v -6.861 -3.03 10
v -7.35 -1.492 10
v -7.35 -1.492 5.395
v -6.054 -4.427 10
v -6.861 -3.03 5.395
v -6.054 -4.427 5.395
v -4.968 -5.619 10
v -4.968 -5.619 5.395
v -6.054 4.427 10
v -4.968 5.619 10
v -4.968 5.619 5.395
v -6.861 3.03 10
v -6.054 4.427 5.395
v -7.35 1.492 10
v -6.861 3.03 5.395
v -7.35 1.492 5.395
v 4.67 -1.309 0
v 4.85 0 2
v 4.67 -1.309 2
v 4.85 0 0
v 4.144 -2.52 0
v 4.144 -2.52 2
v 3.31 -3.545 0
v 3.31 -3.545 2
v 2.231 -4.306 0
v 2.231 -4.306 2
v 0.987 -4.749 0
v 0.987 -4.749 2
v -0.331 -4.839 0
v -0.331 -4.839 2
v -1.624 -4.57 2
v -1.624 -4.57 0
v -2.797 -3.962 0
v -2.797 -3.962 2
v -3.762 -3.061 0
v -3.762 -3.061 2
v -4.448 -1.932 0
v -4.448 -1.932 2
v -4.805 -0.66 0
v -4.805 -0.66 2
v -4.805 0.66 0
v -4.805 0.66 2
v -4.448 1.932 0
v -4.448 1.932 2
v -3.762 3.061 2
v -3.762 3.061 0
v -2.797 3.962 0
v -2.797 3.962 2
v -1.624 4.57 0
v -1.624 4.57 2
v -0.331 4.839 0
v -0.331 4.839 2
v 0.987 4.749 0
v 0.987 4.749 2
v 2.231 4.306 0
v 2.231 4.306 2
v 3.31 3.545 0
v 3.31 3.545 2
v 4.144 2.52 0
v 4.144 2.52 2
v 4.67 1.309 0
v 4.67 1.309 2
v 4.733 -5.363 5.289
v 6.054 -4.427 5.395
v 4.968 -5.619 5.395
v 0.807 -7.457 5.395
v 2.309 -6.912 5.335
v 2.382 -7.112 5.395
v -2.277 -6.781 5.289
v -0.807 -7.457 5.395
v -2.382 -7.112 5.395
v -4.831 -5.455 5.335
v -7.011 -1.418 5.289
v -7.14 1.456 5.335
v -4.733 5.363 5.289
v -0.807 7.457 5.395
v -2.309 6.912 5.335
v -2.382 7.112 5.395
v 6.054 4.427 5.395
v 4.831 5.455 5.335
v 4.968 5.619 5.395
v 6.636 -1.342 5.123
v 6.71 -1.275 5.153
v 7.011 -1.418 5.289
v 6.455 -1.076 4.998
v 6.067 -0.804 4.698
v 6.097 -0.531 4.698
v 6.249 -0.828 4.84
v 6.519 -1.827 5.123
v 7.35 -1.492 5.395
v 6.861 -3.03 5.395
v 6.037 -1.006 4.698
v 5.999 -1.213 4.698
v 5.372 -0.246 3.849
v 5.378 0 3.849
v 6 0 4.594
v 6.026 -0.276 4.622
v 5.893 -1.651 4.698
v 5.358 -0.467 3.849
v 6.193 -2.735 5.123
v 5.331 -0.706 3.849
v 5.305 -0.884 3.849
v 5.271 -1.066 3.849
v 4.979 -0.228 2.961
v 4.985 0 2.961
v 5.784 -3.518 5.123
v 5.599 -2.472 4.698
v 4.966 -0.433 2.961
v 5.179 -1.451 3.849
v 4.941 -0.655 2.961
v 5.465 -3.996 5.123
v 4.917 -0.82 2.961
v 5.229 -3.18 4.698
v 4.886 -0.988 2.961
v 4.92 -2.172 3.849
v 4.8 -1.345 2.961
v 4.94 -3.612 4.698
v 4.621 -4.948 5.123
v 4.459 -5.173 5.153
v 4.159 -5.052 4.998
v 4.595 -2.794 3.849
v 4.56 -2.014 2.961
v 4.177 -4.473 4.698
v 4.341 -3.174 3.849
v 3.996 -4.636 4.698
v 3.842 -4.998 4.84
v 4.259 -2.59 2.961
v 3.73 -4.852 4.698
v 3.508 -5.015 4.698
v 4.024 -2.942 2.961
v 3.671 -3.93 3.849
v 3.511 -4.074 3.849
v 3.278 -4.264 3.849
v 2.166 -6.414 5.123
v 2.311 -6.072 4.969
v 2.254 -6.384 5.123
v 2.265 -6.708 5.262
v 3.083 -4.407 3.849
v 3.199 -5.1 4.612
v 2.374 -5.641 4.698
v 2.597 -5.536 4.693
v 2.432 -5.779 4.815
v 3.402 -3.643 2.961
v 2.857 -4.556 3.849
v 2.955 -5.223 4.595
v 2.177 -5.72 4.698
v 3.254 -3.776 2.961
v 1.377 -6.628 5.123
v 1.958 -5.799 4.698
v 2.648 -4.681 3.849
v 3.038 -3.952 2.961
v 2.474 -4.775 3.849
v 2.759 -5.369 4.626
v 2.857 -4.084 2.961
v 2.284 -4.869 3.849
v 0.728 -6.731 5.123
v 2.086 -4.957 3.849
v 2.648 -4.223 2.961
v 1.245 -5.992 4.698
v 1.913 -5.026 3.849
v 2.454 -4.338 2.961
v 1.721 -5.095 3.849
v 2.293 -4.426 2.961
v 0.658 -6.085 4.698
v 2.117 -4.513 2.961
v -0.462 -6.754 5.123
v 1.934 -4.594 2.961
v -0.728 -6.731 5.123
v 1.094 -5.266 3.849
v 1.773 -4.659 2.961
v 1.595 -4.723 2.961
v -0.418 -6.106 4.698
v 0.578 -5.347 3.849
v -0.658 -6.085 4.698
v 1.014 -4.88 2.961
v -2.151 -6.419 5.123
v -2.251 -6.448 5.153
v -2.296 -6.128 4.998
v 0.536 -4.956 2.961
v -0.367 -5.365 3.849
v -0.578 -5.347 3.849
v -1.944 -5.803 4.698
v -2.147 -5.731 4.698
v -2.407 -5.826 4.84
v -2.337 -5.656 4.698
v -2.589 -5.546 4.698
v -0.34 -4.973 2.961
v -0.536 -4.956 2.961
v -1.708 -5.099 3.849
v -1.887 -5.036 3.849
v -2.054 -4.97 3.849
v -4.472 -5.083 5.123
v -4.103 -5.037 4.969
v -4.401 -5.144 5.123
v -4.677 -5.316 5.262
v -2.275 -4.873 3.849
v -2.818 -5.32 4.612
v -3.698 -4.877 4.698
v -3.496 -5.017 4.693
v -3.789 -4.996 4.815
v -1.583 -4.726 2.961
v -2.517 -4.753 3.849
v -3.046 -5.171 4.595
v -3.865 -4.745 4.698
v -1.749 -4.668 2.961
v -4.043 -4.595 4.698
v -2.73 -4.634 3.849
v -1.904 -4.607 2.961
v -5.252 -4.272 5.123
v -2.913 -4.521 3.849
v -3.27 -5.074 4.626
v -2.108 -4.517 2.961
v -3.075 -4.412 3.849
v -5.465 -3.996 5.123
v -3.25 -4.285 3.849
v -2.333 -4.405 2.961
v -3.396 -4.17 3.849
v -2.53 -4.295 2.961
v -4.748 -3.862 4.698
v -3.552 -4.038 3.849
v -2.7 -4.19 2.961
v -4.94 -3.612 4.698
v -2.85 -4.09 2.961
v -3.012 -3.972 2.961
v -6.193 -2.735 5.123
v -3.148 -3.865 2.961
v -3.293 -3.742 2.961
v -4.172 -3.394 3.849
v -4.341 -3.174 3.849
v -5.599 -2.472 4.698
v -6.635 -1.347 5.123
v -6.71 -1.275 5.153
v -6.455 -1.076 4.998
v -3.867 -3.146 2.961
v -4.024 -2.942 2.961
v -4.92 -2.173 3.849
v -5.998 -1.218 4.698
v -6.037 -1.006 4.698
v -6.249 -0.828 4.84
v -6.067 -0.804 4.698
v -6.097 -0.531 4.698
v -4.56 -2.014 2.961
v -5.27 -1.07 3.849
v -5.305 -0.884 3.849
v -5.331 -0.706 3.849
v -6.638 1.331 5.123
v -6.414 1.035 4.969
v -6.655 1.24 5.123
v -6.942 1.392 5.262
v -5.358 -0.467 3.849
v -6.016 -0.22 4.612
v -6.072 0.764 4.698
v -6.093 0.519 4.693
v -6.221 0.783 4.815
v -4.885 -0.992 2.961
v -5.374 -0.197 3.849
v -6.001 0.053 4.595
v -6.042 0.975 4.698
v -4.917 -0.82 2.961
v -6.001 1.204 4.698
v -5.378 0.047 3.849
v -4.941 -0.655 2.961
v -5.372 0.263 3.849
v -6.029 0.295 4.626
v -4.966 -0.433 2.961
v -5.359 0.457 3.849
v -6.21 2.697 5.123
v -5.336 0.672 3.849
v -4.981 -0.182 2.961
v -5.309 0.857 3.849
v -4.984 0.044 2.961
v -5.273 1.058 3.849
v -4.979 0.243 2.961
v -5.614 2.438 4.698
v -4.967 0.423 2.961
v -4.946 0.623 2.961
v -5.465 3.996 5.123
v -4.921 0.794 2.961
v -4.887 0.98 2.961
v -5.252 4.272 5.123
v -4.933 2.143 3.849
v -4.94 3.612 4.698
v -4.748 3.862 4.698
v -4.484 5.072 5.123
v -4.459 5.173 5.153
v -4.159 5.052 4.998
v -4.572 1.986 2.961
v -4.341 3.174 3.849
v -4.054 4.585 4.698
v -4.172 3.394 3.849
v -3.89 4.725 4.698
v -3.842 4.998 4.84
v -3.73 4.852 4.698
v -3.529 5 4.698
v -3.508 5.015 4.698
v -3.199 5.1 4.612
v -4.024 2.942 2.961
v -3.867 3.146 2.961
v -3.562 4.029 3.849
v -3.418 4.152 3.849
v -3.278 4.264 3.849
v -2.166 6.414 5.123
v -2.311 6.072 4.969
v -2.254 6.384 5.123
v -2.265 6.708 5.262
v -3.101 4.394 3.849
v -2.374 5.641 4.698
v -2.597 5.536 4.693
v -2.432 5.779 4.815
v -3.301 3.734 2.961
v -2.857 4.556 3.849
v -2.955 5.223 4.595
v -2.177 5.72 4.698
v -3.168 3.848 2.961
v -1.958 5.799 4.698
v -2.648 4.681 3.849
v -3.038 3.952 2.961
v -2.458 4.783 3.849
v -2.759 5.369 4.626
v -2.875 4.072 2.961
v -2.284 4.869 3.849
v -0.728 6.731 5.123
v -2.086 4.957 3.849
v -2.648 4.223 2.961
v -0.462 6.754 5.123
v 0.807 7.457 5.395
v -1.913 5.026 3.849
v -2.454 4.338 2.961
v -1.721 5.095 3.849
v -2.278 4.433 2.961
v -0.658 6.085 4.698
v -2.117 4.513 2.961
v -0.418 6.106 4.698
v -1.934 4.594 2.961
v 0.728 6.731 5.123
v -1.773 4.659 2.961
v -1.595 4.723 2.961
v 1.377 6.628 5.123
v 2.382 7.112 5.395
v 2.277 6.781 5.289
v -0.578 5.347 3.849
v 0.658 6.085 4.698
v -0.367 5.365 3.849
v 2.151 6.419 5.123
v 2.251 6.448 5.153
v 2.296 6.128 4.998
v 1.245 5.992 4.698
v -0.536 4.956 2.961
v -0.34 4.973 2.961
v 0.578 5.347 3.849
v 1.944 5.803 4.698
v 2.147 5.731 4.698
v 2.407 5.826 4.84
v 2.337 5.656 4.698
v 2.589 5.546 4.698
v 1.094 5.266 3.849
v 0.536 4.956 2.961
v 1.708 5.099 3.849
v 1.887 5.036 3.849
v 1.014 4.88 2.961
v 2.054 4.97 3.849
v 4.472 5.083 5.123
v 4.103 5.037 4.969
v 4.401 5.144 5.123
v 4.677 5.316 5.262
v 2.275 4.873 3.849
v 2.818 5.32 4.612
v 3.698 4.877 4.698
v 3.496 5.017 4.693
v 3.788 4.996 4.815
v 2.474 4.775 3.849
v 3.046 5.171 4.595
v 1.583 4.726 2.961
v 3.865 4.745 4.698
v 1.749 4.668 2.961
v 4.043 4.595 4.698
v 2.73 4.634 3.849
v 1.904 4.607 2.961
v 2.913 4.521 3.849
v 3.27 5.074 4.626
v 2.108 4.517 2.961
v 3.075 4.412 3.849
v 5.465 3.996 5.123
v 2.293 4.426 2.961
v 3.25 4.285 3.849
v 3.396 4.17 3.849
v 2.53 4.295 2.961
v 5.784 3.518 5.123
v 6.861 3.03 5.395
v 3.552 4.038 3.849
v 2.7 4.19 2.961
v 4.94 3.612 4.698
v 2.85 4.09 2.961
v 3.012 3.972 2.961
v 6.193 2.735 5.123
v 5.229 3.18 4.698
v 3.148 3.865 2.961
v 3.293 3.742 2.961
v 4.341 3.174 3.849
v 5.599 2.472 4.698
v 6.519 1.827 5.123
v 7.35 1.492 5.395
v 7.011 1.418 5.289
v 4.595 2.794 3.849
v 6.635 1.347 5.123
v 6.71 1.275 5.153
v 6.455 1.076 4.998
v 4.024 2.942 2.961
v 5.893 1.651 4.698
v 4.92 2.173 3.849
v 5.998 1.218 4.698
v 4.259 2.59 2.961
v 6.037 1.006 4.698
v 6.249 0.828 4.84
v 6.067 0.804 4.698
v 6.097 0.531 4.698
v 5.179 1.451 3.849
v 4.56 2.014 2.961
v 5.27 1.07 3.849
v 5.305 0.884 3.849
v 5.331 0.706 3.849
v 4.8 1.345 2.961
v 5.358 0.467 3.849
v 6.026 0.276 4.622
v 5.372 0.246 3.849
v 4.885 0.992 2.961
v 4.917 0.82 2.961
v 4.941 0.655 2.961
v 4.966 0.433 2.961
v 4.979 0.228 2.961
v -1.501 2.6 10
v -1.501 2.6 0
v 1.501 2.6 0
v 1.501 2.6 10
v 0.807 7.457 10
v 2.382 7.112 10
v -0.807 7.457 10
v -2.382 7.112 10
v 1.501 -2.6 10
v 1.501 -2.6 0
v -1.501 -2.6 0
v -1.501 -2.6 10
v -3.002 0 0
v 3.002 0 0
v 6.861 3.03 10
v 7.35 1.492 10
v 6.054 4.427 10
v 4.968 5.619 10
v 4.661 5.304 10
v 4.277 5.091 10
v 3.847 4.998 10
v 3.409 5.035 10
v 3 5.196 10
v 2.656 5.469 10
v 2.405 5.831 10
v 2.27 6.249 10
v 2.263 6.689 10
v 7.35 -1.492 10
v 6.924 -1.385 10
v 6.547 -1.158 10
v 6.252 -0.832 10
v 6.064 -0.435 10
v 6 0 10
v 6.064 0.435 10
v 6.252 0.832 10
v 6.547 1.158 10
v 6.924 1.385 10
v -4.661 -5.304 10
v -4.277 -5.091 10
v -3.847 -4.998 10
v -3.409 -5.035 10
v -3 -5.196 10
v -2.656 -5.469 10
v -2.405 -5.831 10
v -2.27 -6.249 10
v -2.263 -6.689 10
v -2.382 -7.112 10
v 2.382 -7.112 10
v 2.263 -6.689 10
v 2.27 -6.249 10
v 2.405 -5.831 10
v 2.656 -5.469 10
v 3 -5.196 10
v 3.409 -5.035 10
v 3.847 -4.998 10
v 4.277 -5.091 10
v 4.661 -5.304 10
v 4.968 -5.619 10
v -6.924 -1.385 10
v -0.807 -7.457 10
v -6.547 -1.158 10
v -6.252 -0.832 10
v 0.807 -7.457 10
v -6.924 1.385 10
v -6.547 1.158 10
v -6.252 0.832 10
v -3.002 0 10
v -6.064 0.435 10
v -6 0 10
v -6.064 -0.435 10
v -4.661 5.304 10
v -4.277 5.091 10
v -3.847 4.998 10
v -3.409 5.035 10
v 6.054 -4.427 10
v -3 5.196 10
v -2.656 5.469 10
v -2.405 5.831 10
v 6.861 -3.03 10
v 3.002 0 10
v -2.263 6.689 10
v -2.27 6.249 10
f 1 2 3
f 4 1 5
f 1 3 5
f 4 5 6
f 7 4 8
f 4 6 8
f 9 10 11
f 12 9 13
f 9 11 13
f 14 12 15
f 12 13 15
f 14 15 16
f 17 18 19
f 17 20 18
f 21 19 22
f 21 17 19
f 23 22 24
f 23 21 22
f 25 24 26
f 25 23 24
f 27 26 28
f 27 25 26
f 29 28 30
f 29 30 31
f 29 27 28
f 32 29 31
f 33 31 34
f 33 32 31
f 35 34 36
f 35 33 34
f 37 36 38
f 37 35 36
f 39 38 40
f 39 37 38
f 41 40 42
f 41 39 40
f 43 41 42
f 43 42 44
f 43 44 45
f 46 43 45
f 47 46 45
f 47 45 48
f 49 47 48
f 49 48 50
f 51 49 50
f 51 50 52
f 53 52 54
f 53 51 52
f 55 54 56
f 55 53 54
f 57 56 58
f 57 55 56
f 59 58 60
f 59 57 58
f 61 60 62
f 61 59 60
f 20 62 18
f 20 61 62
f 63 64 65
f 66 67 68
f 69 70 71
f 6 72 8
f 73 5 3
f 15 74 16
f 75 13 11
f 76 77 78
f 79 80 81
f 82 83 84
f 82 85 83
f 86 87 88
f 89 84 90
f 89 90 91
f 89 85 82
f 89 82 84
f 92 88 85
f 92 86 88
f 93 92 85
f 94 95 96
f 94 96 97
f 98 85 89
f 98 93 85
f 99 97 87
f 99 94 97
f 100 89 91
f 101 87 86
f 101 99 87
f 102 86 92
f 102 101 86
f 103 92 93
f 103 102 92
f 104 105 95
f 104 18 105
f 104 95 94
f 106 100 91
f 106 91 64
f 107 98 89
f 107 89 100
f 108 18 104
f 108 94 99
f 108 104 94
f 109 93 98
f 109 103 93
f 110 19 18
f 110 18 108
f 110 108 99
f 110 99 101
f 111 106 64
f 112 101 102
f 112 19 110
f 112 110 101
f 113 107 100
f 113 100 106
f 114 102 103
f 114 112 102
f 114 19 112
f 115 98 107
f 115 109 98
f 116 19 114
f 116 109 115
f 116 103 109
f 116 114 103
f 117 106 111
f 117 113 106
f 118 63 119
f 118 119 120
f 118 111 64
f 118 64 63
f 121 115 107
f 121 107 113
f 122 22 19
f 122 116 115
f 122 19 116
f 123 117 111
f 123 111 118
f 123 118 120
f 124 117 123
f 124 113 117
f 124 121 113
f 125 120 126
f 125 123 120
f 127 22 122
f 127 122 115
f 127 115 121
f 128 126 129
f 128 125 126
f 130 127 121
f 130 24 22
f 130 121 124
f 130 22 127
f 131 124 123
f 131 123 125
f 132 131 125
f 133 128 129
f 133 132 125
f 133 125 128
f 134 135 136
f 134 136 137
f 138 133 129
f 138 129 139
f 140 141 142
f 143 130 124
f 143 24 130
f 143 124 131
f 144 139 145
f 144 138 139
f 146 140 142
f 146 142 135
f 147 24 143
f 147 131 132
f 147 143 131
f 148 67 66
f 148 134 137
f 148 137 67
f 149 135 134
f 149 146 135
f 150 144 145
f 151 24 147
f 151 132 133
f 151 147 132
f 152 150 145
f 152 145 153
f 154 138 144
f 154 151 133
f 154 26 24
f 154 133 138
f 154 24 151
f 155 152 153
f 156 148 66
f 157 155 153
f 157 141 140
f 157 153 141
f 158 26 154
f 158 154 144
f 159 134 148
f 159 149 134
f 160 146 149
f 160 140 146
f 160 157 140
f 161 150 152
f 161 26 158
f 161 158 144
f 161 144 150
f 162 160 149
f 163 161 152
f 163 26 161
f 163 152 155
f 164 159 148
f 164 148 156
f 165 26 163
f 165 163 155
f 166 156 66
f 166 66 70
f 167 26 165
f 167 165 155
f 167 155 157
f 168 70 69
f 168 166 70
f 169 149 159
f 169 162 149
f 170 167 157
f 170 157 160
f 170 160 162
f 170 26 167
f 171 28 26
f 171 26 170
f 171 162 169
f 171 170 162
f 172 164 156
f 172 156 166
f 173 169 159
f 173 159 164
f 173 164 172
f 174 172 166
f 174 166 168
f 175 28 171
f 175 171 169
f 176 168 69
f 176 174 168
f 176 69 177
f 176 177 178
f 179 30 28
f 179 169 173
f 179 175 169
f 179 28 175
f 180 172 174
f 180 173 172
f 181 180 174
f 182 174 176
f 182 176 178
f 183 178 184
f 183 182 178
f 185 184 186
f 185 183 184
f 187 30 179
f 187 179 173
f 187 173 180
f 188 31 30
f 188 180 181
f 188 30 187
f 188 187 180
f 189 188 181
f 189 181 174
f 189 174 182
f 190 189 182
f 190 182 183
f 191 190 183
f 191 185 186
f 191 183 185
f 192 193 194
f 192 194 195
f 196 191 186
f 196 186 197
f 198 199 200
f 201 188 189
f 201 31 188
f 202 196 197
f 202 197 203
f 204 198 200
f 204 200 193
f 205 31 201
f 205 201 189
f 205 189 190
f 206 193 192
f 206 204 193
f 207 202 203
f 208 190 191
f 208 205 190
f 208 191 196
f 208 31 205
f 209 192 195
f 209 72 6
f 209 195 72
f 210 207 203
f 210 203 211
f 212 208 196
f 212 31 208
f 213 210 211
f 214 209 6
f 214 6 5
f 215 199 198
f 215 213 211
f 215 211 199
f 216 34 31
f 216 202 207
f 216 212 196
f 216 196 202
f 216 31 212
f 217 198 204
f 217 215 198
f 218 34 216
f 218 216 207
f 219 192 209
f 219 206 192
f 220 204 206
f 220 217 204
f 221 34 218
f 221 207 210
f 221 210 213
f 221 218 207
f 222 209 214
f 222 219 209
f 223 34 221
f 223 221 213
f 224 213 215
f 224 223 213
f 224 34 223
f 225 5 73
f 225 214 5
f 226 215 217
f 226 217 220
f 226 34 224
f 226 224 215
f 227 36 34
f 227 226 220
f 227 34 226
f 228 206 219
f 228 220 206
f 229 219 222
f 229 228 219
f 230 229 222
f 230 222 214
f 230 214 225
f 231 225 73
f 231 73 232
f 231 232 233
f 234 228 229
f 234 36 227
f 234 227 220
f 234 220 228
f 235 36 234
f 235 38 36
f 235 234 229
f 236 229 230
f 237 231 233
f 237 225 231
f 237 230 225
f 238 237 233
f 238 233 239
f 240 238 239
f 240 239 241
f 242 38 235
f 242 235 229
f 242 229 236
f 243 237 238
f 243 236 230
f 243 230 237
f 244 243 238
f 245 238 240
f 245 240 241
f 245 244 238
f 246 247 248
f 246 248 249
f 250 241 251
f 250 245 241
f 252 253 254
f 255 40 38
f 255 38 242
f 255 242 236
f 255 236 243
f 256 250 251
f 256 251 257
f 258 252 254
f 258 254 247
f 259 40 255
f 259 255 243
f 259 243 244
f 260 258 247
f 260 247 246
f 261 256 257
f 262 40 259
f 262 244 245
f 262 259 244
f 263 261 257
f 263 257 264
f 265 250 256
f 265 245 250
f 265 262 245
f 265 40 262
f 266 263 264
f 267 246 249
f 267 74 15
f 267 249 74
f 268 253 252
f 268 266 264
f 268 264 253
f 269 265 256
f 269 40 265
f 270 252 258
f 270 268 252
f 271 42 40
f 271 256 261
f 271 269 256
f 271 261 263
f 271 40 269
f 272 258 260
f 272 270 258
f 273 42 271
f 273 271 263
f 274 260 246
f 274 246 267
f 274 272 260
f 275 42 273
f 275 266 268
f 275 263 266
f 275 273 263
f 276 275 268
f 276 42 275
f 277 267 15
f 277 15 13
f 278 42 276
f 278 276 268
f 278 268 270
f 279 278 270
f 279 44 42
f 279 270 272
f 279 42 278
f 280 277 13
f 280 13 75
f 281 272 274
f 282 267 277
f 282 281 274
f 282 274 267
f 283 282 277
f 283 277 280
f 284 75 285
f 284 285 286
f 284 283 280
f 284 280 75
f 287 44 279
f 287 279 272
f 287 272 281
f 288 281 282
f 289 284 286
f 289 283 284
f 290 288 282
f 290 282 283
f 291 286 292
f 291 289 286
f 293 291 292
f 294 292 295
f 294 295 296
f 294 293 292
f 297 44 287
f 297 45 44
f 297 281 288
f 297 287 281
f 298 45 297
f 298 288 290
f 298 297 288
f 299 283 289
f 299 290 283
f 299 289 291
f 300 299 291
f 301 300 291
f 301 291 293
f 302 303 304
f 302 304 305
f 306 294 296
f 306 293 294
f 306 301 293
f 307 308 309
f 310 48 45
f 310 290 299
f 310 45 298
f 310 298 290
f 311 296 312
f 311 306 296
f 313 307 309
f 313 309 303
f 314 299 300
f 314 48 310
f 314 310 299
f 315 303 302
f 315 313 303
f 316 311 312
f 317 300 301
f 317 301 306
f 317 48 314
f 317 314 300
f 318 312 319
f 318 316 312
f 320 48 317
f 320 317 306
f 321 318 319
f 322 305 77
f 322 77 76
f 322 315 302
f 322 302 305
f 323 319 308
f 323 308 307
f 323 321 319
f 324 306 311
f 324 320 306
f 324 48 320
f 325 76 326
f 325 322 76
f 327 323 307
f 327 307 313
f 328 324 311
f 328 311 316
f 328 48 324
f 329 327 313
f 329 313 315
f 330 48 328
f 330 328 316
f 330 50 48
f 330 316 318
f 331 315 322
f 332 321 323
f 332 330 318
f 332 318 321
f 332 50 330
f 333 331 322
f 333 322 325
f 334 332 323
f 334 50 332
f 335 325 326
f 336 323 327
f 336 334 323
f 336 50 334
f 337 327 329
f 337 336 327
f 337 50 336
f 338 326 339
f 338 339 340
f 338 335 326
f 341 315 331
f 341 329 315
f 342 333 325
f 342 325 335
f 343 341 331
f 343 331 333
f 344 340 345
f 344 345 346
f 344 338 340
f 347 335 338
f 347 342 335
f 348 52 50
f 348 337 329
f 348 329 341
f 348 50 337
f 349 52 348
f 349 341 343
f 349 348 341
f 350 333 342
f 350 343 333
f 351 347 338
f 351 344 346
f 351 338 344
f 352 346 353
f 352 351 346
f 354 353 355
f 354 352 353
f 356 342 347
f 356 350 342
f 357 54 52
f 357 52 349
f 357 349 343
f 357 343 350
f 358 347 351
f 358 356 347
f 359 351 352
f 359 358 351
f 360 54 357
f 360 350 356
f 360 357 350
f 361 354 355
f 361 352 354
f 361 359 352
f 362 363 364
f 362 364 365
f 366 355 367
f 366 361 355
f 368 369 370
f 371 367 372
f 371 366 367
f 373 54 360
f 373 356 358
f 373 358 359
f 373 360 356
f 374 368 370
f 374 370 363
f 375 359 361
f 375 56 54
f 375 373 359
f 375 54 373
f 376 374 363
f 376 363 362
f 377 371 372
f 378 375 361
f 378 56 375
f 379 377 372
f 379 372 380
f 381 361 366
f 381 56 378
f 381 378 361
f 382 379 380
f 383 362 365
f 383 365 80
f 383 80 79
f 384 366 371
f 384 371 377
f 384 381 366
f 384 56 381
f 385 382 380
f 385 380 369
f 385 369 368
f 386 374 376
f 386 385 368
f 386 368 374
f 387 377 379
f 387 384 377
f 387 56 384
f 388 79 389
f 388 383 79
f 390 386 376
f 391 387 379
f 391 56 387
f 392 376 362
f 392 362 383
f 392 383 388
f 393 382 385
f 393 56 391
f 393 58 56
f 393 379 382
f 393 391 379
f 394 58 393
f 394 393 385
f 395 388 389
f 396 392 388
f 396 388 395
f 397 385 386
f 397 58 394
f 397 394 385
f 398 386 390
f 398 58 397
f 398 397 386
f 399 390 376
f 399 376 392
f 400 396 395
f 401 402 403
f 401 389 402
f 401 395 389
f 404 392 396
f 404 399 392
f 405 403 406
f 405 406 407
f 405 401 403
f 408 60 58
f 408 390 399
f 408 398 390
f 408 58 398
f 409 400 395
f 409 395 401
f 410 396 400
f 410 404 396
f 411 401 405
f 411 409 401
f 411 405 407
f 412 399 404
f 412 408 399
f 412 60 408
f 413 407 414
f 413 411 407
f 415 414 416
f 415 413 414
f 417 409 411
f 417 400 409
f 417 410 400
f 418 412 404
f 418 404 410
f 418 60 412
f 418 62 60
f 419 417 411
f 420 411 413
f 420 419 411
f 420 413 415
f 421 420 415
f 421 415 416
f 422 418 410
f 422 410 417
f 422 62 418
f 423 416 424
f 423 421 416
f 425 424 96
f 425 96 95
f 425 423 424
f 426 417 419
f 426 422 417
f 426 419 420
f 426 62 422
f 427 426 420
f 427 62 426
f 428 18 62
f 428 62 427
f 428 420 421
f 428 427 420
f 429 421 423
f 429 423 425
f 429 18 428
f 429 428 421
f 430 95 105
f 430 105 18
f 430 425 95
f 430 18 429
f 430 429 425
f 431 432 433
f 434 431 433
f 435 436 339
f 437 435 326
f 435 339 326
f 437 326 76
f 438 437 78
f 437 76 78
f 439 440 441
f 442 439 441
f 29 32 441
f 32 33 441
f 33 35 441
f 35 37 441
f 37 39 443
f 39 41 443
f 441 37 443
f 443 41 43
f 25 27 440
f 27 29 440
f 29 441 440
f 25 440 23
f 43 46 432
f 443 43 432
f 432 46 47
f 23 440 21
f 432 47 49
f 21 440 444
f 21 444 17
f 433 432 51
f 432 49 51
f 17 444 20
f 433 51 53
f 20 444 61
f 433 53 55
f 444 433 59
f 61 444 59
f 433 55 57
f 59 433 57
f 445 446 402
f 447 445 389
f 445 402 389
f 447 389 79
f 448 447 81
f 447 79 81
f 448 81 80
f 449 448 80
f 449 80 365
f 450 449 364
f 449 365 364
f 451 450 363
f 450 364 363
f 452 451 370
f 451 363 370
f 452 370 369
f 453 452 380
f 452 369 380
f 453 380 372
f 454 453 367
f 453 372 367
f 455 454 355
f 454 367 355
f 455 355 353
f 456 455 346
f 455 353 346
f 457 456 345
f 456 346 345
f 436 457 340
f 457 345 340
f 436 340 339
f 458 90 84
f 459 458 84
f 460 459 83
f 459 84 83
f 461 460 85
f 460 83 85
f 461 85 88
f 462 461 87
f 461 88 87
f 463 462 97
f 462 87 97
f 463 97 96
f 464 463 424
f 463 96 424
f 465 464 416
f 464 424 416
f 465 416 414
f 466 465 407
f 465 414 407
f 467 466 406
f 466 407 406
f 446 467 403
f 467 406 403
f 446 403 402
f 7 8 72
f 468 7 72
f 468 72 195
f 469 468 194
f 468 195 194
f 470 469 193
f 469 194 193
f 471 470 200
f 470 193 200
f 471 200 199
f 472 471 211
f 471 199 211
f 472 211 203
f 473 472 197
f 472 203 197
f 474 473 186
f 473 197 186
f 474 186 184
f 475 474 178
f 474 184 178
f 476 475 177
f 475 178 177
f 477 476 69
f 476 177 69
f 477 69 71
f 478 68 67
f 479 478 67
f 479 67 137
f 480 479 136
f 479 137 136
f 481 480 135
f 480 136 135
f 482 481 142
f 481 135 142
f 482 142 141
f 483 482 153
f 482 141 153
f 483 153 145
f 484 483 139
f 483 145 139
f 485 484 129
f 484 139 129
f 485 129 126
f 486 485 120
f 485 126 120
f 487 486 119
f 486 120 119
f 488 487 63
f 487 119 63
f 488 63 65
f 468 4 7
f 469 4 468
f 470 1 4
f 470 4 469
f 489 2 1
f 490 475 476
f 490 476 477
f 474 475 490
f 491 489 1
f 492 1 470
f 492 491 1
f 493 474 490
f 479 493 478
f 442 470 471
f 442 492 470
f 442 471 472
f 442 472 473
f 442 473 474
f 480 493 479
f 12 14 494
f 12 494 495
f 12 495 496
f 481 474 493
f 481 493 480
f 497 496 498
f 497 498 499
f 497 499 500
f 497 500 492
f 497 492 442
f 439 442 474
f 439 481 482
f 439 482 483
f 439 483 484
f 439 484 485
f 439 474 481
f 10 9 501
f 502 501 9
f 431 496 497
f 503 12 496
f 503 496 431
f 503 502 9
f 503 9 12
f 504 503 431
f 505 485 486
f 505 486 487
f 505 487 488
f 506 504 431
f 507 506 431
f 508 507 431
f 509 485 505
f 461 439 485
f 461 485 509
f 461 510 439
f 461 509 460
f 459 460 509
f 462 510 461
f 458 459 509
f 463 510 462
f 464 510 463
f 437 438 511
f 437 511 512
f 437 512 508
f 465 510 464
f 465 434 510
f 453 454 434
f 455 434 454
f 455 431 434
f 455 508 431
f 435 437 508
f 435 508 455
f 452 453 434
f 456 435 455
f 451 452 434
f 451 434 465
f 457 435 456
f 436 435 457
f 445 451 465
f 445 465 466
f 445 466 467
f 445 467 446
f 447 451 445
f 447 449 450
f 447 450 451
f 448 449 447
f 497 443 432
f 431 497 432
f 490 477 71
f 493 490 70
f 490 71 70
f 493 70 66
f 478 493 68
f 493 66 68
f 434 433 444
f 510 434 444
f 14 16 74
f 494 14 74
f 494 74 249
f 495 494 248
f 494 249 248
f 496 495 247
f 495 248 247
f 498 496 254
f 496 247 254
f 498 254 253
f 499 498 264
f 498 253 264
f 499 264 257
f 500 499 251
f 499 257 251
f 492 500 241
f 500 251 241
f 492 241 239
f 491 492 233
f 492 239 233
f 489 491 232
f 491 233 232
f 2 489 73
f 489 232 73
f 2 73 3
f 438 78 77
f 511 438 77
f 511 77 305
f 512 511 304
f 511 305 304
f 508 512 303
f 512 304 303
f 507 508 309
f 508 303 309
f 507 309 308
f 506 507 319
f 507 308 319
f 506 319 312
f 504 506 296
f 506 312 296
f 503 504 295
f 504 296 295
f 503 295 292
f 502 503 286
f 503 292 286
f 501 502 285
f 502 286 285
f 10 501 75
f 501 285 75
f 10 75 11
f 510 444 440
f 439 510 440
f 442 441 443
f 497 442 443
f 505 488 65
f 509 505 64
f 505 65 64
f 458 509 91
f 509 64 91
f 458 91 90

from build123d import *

# Parameters (mm, degrees)
F1_DEPTH = 10


with BuildPart() as f1:
    # F0 (on Top) → F1 (new body)
    with BuildSketch(Plane.XY):
        with BuildLine():
            ThreePointArc((-7.35, 1.492481), (-6, 0), (-7.35, -1.492481))
            ThreePointArc((-7.35, -1.492481), (-6.495191, -3.75), (-4.967527, -5.619046))
            ThreePointArc((-4.967527, -5.619046), (-3, -5.196152), (-2.382473, -7.111527))
            ThreePointArc((-2.382473, -7.111527), (0, -7.5), (2.382473, -7.111527))
            ThreePointArc((2.382473, -7.111527), (3, -5.196152), (4.967527, -5.619046))
            ThreePointArc((4.967527, -5.619046), (6.495191, -3.75), (7.35, -1.492481))
            ThreePointArc((7.35, -1.492481), (6, 0), (7.35, 1.492481))
            ThreePointArc((7.35, 1.492481), (6.495191, 3.75), (4.967527, 5.619046))
            ThreePointArc((4.967527, 5.619046), (3, 5.196152), (2.382473, 7.111527))
            ThreePointArc((2.382473, 7.111527), (0, 7.5), (-2.382473, 7.111527))
            ThreePointArc((-2.382473, 7.111527), (-3, 5.196152), (-4.967527, 5.619046))
            ThreePointArc((-4.967527, 5.619046), (-6.495191, 3.75), (-7.35, 1.492481))
        make_face()
        Polygon((-3.002221, 0), (-1.501111, 2.6), (1.501111, 2.6), (3.002221, 0), (1.501111, -2.6), (-1.501111, -2.6), align=None, mode=Mode.SUBTRACT)
    extrude(amount=F1_DEPTH)

    # F2 (on Front) → F3 (revolve, cut)
    with BuildSketch(Plane.XZ):
        with BuildLine():
            Line((4.85, 2), (4.85, 0))
            Line((4.85, 0), (9.85, 0))
            Line((9.85, 0), (9.924296, 5.125954))
            ThreePointArc((9.924296, 5.125954), (6.514249, 4.979936), (4.85, 2))
        make_face()
    revolve(axis=Axis((0, 0, 4.999244), (0, 0, -1)), mode=Mode.SUBTRACT)


solid = f1.part
